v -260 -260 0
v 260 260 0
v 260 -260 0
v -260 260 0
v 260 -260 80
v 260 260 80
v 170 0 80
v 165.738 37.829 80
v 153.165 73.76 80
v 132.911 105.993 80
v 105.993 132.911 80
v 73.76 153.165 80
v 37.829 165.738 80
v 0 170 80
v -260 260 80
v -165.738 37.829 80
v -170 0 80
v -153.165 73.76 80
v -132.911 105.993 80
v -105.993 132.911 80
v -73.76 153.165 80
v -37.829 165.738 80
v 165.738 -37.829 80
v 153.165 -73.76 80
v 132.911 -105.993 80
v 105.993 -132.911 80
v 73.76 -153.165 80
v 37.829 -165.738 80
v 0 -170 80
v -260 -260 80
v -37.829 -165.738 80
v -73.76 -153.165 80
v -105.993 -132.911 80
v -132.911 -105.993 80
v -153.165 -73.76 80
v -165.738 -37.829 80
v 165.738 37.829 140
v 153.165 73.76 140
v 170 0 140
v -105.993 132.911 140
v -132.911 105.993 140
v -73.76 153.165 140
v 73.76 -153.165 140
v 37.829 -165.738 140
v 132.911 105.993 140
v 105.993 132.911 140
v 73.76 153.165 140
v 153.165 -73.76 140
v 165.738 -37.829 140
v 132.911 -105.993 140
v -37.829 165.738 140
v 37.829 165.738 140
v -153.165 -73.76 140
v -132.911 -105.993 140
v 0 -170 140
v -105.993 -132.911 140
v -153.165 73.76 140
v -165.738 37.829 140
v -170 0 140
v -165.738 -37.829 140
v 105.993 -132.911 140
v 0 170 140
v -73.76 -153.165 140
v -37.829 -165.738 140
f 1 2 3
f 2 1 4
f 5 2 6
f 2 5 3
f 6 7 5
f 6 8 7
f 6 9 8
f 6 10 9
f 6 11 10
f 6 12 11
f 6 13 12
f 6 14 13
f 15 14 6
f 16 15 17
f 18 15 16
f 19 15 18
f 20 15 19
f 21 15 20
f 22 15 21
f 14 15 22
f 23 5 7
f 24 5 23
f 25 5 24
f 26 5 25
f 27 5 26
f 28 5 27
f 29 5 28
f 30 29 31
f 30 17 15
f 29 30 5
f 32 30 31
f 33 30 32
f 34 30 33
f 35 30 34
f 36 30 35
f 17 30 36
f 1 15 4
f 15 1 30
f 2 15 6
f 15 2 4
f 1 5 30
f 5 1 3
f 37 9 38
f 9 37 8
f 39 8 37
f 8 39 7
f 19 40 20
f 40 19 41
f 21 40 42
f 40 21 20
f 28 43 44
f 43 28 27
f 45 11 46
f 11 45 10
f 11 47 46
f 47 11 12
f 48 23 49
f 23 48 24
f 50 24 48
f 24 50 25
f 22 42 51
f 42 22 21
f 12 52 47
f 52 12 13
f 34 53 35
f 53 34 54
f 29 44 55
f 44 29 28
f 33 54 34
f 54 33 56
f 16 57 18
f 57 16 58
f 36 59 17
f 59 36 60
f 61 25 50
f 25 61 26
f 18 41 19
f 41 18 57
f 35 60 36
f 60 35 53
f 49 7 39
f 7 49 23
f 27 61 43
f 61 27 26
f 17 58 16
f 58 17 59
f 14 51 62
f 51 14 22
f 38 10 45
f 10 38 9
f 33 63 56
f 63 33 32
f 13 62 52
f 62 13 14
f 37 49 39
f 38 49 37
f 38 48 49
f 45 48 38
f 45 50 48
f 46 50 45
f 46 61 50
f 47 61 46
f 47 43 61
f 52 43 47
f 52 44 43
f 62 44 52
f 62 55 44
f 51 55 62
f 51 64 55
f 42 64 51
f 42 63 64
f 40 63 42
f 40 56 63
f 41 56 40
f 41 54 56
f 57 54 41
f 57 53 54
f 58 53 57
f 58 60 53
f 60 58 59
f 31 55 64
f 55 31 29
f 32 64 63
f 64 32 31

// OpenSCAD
// Articulated inspection boom — rotatable SCAD mechanical diagram.
// Compile one joint mesh with: openscad -D 'part="shoulder"' -o shoulder.stl mechanism.scad
part = "pedestal";

module box(sx, sy, sz) { cube([sx, sy, sz], center = true); }
module cyl(h, r, r2 = undef) {
    cylinder(h = h, r1 = r, r2 = (r2 == undef ? r : r2), center = true, $fn = 28);
}

module pedestal_geom() {
    translate([0, 0, 40]) box(520, 520, 80);
    translate([0, 0, 110]) cyl(60, 170);
    for (a = [0:90:270]) rotate([0, 0, a]) translate([180, 0, 20]) cyl(40, 28);
}

module slew_geom() {
    // Local origin = slew pivot (top of pedestal column).
    translate([0, 0, 40]) cyl(80, 150);
    translate([0, 0, 110]) box(280, 280, 60);
    translate([0, -40, 180]) box(160, 120, 160);
    translate([0, 0, 220]) cyl(40, 70);
}

module shoulder_geom() {
    translate([0, 0, 0]) rotate([0, 90, 0]) cyl(140, 55);
    translate([0, 0, 280]) box(90, 110, 560);
    translate([0, 0, 560]) rotate([0, 90, 0]) cyl(120, 48);
    translate([55, 0, 180]) box(18, 70, 220);
    translate([-55, 0, 180]) box(18, 70, 220);
}

module elbow_geom() {
    translate([0, 0, 0]) rotate([0, 90, 0]) cyl(110, 44);
    translate([0, 0, 290]) box(70, 90, 580);
    translate([0, 0, 580]) rotate([0, 90, 0]) cyl(100, 38);
    translate([40, 0, 200]) box(14, 54, 260);
    translate([-40, 0, 200]) box(14, 54, 260);
}

module wrist_geom() {
    translate([0, 0, 0]) cyl(50, 42);
    translate([0, 0, 70]) box(90, 90, 90);
    translate([0, 0, 130]) cyl(40, 34);
}

module tool_geom() {
    translate([0, 0, 20]) box(70, 40, 40);
    translate([0, 28, 55]) box(18, 70, 18);
    translate([0, -28, 55]) box(18, 70, 18);
    translate([0, 55, 90]) box(14, 18, 50);
    translate([0, -55, 90]) box(14, 18, 50);
}

if (part == "pedestal") pedestal_geom();
if (part == "slew") slew_geom();
if (part == "shoulder") shoulder_geom();
if (part == "elbow") elbow_geom();
if (part == "wrist") wrist_geom();
if (part == "tool") tool_geom();
